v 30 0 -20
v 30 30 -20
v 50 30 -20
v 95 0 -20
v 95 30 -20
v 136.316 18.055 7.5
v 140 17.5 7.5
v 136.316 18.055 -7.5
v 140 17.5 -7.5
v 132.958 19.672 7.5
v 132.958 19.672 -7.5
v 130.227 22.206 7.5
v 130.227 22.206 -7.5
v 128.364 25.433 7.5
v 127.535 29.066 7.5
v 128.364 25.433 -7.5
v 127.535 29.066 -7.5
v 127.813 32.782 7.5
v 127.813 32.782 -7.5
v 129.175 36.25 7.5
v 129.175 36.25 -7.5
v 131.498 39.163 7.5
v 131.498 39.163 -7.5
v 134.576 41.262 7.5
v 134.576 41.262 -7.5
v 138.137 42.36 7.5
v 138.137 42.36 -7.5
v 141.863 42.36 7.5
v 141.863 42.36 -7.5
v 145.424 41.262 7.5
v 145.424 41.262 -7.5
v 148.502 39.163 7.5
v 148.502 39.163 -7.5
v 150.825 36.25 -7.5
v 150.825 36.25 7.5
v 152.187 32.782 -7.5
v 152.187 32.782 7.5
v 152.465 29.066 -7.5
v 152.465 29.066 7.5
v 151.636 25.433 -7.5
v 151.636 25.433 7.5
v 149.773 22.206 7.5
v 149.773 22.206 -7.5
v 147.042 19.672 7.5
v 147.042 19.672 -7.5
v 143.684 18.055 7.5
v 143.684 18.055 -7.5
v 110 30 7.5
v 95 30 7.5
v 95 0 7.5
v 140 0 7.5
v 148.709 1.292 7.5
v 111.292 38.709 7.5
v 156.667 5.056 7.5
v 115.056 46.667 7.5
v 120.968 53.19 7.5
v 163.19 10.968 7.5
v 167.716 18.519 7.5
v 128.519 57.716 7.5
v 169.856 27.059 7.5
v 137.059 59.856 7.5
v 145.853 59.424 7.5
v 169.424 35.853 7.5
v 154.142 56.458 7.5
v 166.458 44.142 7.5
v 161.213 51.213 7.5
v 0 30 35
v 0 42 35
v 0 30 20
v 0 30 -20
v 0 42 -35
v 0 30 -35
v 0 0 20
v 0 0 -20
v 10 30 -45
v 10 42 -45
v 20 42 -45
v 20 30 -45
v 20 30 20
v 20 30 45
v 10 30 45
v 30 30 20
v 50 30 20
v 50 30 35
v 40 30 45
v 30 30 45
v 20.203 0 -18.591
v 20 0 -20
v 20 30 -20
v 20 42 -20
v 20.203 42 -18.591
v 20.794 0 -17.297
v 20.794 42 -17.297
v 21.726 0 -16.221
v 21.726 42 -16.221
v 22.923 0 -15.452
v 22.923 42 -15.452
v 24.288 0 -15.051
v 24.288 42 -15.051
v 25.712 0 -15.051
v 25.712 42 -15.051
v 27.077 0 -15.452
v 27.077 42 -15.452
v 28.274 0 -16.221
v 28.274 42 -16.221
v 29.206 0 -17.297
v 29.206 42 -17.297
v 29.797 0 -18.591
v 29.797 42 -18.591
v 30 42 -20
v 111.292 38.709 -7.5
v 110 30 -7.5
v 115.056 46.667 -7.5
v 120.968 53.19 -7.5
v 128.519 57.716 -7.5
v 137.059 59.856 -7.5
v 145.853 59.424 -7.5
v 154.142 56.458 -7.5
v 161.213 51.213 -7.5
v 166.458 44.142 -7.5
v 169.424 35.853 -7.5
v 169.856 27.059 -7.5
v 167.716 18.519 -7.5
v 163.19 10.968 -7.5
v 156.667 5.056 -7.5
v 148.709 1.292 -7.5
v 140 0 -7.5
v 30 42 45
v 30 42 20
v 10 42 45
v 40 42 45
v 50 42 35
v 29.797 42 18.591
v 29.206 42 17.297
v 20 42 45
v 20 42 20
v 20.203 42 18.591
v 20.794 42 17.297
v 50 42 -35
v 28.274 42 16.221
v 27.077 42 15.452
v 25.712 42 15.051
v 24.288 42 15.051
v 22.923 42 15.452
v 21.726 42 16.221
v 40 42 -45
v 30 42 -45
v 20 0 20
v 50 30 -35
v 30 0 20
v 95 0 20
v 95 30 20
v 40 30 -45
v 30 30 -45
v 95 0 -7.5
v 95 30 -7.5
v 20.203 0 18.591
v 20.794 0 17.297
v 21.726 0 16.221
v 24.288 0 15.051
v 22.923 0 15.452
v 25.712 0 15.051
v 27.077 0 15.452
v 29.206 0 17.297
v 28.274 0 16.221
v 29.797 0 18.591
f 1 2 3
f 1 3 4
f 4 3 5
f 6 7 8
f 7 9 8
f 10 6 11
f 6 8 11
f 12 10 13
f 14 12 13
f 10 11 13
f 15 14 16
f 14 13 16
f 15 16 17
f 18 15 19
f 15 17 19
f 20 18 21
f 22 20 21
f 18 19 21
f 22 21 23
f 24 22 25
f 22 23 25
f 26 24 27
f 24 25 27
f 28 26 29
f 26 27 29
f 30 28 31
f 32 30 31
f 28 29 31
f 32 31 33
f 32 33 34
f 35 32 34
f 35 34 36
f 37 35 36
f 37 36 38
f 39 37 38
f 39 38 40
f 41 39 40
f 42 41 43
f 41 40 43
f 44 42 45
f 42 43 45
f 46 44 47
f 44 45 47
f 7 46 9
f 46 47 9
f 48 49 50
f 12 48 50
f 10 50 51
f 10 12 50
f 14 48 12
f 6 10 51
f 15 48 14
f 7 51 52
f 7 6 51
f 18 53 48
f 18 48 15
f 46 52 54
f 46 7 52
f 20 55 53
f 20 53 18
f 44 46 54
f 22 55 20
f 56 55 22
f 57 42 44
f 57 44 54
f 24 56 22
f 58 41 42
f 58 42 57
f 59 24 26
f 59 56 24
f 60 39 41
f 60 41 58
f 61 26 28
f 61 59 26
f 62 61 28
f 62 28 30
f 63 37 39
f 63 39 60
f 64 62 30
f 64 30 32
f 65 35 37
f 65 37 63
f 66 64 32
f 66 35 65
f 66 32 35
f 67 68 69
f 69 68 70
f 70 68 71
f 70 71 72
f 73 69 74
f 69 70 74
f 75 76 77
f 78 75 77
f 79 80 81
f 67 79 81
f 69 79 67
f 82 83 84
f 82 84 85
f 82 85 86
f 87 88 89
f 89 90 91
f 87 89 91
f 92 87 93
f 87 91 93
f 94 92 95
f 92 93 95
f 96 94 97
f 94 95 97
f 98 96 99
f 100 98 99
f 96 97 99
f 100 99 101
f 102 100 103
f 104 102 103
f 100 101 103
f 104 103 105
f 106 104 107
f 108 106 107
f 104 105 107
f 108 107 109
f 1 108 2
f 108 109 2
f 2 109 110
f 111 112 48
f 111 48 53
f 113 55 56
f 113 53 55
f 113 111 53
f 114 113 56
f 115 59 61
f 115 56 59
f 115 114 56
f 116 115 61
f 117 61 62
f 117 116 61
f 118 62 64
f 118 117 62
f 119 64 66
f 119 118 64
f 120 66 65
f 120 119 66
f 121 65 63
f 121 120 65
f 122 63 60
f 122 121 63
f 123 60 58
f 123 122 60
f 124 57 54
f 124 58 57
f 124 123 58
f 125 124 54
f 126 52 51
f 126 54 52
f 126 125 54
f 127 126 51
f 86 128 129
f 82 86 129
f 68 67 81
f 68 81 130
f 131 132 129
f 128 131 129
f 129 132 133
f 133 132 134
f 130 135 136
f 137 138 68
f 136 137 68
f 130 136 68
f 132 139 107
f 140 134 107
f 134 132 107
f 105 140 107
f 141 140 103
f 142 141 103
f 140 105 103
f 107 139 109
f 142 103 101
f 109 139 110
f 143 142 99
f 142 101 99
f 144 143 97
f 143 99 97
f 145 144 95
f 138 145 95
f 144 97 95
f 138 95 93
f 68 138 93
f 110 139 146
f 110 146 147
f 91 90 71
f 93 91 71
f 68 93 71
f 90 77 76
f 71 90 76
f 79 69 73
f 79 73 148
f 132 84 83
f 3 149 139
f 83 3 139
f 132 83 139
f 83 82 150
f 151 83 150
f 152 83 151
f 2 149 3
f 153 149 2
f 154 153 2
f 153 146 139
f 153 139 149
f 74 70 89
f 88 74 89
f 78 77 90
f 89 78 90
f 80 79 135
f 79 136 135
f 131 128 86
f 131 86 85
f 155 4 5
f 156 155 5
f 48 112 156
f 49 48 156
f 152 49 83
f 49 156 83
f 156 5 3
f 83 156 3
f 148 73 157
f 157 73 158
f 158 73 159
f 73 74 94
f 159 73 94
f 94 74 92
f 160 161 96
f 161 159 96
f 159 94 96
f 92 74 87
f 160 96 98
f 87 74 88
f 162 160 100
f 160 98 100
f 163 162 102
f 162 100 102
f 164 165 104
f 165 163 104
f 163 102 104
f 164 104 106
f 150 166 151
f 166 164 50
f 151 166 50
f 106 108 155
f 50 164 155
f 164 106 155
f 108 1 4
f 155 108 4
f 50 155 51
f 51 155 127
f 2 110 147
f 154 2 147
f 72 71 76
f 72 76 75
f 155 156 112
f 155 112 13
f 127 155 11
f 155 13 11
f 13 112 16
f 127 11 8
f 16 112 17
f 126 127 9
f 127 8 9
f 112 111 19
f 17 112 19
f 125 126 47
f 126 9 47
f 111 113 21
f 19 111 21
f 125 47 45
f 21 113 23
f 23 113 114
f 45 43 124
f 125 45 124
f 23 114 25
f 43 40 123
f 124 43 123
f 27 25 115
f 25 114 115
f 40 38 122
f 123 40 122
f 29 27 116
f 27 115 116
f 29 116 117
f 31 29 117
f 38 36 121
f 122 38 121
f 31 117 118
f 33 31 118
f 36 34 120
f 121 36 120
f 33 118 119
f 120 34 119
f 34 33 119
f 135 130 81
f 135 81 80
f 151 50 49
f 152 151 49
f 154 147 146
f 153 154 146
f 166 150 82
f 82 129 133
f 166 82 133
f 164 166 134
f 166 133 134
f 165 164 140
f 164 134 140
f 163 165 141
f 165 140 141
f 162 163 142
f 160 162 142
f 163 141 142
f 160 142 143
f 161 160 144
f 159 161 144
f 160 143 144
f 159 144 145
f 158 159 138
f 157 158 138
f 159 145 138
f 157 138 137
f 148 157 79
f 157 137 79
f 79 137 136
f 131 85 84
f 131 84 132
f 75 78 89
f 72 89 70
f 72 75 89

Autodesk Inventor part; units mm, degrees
ref_plane "YZ Plane" through (0, 0, 0) normal (1, 0, 0) x (0, 1, 0)
ref_plane "XZ Plane" through (0, 0, 0) normal (0, 1, 0) x (-1, 0, 0)
ref_plane "XY Plane" through (0, 0, 0) normal (0, 0, 1) x (1, 0, 0)
sketch "Esboço1" plane through (0, 0, 0) normal (0, 0, 1) x (1, 0, 0)
  line L0 (0, 0) -> (95, 0)
  line L1 (95, 0) -> (95, 30)
  line L2 (95, 30) -> (0, 30)
  line L3 (0, 30) -> (0, 0)
  line L4 (0, 30) -> (50, 30)
  line L5 (50, 30) -> (50, 42)
  line L6 (50, 42) -> (0, 42)
  line L7 (0, 42) -> (0, 30)
  line L8 (95, 0) -> (140, 0)
  line L9 (110, 30) -> (95, 30)
  line L10 (95, 30) -> (95, 0)
  arc A0 (140, 0) -> (110, 30) centre (140, 30) ccw
  dimension "d0" = 95
  dimension "d1" = 30
  dimension "d2" = 50
  dimension "d3" = 12
  dimension "d5" = 60
  dimension "d6" = 140
extrude "Extrusão1" add sketch "Esboço1" along normal mid plane 40 contours L3 L2 L1 L0
extrude "Extrusão2" add sketch "Esboço1" along normal mid plane 90 contours L7 L6 L5 L2
extrude "Extrusão3" add sketch "Esboço1" along normal mid plane 15 contours L1 L9 A0 L8
sketch "Esboço2" plane through (0, 0, 7.5) normal (0, 0, 1) x (1, 0, 0)
  arc A0 (140, 0) -> (110, 30) centre (140, 30) ccw projected
  point P0 (0, 0)
hole "Furo1" at (140, 30, 7.5) direction (0, 0, -1) diameter 25 end through all
sketch "Esboço3" plane through (0, 42, 45) normal (0, 1, 0) x (1, 0, 0)
  line L0 (25, -25) -> (25, 25) construction
  line L1 (50, 0) -> (0, 0) projected
  line L2 (30, -25) -> (30, 25)
  line L3 (20, 25) -> (20, -25)
  arc A0 (20, -25) -> (30, -25) centre (25, -25) ccw
  arc A1 (30, 25) -> (20, 25) centre (25, 25) ccw
  line L4 (25, 115) -> (25, 65) construction
  line L5 (50, 90) -> (0, 90) projected
  line L6 (20, 115) -> (20, 65)
  line L7 (30, 65) -> (30, 115)
  arc A2 (30, 115) -> (20, 115) centre (25, 115) ccw
  arc A3 (20, 65) -> (30, 65) centre (25, 65) ccw
  point P0 (0, 45)
  point P1 (25, 0)
  point P2 (25, 90)
  point P3 (20, 0)
  point P4 (30, 0)
  dimension "d20" = 5
  dimension "d21" = 5
  dimension "d22" = 25
  dimension "d23" = 25
extrude "Extrusão4" cut sketch "Esboço3" against normal through all contours L1 L3 A1 L2
extrude "Extrusão5" cut sketch "Esboço3" against normal through all contours L7 A3 L6 L5 | L5 L6 A2 L7
chamfer "Chanfro1" distance 10 angle 45 1 edges at (0, 36, 45) measured on face at (0, 10, 6.6667)
chamfer "Chanfro2" distance 10 angle 45 1 edges at (50, 36, 45) measured on face at (50, 38, -6.6667)
chamfer "Chanfro3" distance 10 angle 45 1 edges at (50, 36, -45) measured on face at (50, 38, -10)
chamfer "Chanfro4" distance 10 angle 45 1 edges at (0, 36, -45) measured on face at (0, 10, 6.6667)
properties part number "Peça teste 4"
